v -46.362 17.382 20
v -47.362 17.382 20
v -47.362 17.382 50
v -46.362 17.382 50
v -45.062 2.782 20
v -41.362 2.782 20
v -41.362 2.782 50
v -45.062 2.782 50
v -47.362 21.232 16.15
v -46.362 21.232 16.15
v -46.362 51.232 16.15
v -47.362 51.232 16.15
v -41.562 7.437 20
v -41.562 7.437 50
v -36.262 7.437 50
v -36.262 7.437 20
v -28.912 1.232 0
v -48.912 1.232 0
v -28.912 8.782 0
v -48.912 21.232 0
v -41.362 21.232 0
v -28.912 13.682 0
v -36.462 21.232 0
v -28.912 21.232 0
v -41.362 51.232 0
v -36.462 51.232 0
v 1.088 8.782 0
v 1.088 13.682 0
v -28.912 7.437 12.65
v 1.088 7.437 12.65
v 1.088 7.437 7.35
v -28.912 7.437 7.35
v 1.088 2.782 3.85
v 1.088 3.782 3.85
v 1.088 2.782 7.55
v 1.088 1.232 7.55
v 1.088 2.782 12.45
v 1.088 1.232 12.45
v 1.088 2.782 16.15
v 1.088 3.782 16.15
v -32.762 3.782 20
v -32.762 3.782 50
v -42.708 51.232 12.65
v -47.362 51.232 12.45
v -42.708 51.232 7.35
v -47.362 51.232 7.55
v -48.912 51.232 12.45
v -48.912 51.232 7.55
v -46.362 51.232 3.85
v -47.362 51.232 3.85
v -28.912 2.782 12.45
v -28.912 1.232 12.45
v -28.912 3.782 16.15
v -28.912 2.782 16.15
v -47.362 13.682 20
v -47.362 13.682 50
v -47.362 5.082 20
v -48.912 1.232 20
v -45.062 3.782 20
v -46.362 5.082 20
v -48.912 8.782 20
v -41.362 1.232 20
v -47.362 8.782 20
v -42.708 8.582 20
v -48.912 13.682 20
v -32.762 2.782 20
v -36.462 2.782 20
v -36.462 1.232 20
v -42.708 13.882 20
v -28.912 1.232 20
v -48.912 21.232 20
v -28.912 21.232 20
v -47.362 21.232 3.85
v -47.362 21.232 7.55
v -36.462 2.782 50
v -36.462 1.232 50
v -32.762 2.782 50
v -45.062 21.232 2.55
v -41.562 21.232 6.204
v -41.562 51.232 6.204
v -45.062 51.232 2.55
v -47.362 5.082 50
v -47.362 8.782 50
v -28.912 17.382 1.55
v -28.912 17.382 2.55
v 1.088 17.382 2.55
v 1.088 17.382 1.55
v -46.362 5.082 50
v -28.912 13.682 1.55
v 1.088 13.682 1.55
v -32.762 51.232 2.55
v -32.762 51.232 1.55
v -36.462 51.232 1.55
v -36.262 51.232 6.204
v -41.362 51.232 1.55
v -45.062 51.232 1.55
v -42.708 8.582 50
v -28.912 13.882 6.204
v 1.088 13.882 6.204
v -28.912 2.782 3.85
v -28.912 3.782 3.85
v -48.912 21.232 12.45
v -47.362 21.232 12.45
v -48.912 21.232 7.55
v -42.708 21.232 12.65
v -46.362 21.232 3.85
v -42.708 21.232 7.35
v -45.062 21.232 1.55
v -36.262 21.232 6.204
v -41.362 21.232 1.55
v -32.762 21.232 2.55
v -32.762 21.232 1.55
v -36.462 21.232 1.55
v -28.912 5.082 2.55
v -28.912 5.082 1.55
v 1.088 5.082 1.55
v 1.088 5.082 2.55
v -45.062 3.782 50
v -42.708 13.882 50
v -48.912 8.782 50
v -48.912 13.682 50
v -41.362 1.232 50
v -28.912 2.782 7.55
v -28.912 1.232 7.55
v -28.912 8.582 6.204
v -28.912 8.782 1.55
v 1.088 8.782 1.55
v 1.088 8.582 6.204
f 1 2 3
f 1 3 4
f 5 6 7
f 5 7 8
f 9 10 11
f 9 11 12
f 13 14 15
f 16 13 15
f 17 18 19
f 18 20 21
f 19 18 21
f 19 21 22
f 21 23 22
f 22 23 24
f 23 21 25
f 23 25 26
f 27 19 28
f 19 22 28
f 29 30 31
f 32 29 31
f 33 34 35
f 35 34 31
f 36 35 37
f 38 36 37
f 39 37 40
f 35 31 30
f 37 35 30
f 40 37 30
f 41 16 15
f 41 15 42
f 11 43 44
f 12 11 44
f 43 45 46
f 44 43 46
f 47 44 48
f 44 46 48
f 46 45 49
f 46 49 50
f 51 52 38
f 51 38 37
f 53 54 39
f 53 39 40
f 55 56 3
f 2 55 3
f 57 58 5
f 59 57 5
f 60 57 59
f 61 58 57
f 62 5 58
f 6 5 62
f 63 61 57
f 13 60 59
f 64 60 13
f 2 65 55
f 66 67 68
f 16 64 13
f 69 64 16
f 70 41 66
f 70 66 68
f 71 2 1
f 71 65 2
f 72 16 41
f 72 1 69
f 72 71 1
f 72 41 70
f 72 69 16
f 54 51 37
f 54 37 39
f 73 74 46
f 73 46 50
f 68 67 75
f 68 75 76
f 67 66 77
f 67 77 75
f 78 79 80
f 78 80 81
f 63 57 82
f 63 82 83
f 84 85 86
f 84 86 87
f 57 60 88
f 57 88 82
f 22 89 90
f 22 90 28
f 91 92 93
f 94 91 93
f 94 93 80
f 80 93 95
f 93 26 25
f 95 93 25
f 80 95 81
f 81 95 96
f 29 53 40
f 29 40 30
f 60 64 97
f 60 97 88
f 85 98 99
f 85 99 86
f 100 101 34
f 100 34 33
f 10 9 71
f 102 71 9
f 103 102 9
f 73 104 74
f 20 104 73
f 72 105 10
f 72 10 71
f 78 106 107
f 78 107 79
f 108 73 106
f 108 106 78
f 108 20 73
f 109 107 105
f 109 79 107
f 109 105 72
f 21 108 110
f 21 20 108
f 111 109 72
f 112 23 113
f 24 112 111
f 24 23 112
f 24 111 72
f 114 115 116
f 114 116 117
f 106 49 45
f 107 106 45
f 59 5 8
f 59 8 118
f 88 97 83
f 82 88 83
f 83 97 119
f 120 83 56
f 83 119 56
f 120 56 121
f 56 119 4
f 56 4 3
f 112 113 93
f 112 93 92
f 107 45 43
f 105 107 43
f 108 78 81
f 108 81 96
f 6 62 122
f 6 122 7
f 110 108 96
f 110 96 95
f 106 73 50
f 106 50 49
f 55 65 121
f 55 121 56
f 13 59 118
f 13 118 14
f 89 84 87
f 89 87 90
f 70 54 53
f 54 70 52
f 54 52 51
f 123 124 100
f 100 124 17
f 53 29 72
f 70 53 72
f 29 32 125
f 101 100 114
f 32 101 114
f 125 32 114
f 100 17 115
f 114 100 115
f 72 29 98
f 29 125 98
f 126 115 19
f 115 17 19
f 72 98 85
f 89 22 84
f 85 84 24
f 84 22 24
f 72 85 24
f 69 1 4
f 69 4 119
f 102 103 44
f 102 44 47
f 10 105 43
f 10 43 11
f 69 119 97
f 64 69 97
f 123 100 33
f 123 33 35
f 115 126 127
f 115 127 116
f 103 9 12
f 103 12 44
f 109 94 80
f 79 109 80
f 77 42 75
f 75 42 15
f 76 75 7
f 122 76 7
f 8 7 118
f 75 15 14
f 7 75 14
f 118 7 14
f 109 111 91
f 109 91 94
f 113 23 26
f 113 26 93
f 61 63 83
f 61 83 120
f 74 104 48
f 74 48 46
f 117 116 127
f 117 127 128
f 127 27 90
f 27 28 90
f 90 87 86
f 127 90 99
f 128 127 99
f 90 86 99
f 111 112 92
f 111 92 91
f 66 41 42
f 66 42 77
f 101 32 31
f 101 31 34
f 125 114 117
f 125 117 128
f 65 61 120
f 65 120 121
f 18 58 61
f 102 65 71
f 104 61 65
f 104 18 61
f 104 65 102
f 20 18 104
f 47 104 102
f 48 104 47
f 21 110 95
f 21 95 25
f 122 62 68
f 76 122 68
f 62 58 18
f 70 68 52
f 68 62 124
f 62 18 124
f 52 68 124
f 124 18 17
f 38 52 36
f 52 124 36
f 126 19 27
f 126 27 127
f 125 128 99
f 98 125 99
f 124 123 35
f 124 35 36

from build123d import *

# Parameters (mm, degrees)
ESQUISSE1_W        = 20
ESQUISSE1_H        = 20
BOSS_EXTRU_1_DEPTH = 20
BOSS_EXTRU_2_DEPTH = 30
BOSS_EXTRU_3_DEPTH = 30
BOSS_EXTRU_4_DEPTH = 30
BOSS_EXTRU_5_DEPTH = 30
BOSS_EXTRU_6_DEPTH = 30
BOSS_EXTRU_7_DEPTH = 30


with BuildPart() as part:
    # Esquisse1 → Boss.-Extru.1 (new body)
    with BuildSketch(Plane.XY):
        with Locations((-38.912352392, 11.232287948)):
            Rectangle(ESQUISSE1_W, ESQUISSE1_H)
    extrude(amount=BOSS_EXTRU_1_DEPTH)

    # Esquisse2 → Boss.-Extru.2 (add)
    with BuildSketch(Plane.XY.offset(20)):
        Polygon((-41.362352392, 1.232287948), (-41.362352392, 2.782287948), (-45.062352392, 2.782287948), (-45.062352392, 3.782287948), (-41.562352392, 7.436545738), (-36.262352392, 7.436545738), (-32.762352392, 3.782287948), (-32.762352392, 2.782287948), (-36.462352392, 2.782287948), (-36.462352392, 1.232287948), align=None)
    extrude(amount=BOSS_EXTRU_2_DEPTH)

    # Esquisse3 → Boss.-Extru.3 (add)
    with BuildSketch(Plane(origin=(-28.912352392, 0, 0), x_dir=(0, 0, -1), z_dir=(1, 0, 0))):
        Polygon((0, 8.782287948), (-1.55, 8.782287948), (-1.55, 5.082287948), (-2.55, 5.082287948), (-6.204257791, 8.582287948), (-6.204257791, 13.882287948), (-2.55, 17.382287948), (-1.55, 17.382287948), (-1.55, 13.682287948), (0, 13.682287948), align=None)
    extrude(amount=BOSS_EXTRU_3_DEPTH)

    # Esquisse4 → Boss.-Extru.4 (add)
    with BuildSketch(Plane(origin=(0, 21.232287948, 0), x_dir=(1, 0, 0), z_dir=(0, 1, 0))):
        Polygon((-36.462352392, 0), (-36.462352392, -1.55), (-32.762352392, -1.55), (-32.762352392, -2.55), (-36.262352392, -6.204257791), (-41.562352392, -6.204257791), (-45.062352392, -2.55), (-45.062352392, -1.55), (-41.362352392, -1.55), (-41.362352392, 0), align=None)
    extrude(amount=BOSS_EXTRU_4_DEPTH)

    # Esquisse6 → Boss.-Extru.5 (add)
    with BuildSketch(Plane(origin=(-28.912352392, 0, 0), x_dir=(0, 0, -1), z_dir=(1, 0, 0))):
        Polygon((-12.45, 1.232287948), (-12.45, 2.782287948), (-16.15, 2.782287948), (-16.15, 3.782287948), (-12.65, 7.436545738), (-7.35, 7.436545738), (-3.85, 3.782287948), (-3.85, 2.782287948), (-7.55, 2.782287948), (-7.55, 1.232287948), align=None)
    extrude(amount=BOSS_EXTRU_5_DEPTH)

    # Esquisse8 → Boss.-Extru.6 (add)
    with BuildSketch(Plane(origin=(0, 21.232287948, 0), x_dir=(1, 0, 0), z_dir=(0, 1, 0))):
        Polygon((-48.912352392, -7.55), (-47.362352392, -7.55), (-47.362352392, -3.85), (-46.362352392, -3.85), (-42.708094601, -7.35), (-42.708094601, -12.65), (-46.362352392, -16.15), (-47.362352392, -16.15), (-47.362352392, -12.45), (-48.912352392, -12.45), align=None)
    extrude(amount=BOSS_EXTRU_6_DEPTH)

    # Esquisse9 → Boss.-Extru.7 (add)
    with BuildSketch(Plane.XY.offset(20)):
        Polygon((-48.912352392, 13.682287948), (-47.362352392, 13.682287948), (-47.362352392, 17.382287948), (-46.362352392, 17.382287948), (-42.708094601, 13.882287948), (-42.708094601, 8.582287948), (-46.362352392, 5.082287948), (-47.362352392, 5.082287948), (-47.362352392, 8.782287948), (-48.912352392, 8.782287948), align=None)
    extrude(amount=BOSS_EXTRU_7_DEPTH)


solid = part.part
